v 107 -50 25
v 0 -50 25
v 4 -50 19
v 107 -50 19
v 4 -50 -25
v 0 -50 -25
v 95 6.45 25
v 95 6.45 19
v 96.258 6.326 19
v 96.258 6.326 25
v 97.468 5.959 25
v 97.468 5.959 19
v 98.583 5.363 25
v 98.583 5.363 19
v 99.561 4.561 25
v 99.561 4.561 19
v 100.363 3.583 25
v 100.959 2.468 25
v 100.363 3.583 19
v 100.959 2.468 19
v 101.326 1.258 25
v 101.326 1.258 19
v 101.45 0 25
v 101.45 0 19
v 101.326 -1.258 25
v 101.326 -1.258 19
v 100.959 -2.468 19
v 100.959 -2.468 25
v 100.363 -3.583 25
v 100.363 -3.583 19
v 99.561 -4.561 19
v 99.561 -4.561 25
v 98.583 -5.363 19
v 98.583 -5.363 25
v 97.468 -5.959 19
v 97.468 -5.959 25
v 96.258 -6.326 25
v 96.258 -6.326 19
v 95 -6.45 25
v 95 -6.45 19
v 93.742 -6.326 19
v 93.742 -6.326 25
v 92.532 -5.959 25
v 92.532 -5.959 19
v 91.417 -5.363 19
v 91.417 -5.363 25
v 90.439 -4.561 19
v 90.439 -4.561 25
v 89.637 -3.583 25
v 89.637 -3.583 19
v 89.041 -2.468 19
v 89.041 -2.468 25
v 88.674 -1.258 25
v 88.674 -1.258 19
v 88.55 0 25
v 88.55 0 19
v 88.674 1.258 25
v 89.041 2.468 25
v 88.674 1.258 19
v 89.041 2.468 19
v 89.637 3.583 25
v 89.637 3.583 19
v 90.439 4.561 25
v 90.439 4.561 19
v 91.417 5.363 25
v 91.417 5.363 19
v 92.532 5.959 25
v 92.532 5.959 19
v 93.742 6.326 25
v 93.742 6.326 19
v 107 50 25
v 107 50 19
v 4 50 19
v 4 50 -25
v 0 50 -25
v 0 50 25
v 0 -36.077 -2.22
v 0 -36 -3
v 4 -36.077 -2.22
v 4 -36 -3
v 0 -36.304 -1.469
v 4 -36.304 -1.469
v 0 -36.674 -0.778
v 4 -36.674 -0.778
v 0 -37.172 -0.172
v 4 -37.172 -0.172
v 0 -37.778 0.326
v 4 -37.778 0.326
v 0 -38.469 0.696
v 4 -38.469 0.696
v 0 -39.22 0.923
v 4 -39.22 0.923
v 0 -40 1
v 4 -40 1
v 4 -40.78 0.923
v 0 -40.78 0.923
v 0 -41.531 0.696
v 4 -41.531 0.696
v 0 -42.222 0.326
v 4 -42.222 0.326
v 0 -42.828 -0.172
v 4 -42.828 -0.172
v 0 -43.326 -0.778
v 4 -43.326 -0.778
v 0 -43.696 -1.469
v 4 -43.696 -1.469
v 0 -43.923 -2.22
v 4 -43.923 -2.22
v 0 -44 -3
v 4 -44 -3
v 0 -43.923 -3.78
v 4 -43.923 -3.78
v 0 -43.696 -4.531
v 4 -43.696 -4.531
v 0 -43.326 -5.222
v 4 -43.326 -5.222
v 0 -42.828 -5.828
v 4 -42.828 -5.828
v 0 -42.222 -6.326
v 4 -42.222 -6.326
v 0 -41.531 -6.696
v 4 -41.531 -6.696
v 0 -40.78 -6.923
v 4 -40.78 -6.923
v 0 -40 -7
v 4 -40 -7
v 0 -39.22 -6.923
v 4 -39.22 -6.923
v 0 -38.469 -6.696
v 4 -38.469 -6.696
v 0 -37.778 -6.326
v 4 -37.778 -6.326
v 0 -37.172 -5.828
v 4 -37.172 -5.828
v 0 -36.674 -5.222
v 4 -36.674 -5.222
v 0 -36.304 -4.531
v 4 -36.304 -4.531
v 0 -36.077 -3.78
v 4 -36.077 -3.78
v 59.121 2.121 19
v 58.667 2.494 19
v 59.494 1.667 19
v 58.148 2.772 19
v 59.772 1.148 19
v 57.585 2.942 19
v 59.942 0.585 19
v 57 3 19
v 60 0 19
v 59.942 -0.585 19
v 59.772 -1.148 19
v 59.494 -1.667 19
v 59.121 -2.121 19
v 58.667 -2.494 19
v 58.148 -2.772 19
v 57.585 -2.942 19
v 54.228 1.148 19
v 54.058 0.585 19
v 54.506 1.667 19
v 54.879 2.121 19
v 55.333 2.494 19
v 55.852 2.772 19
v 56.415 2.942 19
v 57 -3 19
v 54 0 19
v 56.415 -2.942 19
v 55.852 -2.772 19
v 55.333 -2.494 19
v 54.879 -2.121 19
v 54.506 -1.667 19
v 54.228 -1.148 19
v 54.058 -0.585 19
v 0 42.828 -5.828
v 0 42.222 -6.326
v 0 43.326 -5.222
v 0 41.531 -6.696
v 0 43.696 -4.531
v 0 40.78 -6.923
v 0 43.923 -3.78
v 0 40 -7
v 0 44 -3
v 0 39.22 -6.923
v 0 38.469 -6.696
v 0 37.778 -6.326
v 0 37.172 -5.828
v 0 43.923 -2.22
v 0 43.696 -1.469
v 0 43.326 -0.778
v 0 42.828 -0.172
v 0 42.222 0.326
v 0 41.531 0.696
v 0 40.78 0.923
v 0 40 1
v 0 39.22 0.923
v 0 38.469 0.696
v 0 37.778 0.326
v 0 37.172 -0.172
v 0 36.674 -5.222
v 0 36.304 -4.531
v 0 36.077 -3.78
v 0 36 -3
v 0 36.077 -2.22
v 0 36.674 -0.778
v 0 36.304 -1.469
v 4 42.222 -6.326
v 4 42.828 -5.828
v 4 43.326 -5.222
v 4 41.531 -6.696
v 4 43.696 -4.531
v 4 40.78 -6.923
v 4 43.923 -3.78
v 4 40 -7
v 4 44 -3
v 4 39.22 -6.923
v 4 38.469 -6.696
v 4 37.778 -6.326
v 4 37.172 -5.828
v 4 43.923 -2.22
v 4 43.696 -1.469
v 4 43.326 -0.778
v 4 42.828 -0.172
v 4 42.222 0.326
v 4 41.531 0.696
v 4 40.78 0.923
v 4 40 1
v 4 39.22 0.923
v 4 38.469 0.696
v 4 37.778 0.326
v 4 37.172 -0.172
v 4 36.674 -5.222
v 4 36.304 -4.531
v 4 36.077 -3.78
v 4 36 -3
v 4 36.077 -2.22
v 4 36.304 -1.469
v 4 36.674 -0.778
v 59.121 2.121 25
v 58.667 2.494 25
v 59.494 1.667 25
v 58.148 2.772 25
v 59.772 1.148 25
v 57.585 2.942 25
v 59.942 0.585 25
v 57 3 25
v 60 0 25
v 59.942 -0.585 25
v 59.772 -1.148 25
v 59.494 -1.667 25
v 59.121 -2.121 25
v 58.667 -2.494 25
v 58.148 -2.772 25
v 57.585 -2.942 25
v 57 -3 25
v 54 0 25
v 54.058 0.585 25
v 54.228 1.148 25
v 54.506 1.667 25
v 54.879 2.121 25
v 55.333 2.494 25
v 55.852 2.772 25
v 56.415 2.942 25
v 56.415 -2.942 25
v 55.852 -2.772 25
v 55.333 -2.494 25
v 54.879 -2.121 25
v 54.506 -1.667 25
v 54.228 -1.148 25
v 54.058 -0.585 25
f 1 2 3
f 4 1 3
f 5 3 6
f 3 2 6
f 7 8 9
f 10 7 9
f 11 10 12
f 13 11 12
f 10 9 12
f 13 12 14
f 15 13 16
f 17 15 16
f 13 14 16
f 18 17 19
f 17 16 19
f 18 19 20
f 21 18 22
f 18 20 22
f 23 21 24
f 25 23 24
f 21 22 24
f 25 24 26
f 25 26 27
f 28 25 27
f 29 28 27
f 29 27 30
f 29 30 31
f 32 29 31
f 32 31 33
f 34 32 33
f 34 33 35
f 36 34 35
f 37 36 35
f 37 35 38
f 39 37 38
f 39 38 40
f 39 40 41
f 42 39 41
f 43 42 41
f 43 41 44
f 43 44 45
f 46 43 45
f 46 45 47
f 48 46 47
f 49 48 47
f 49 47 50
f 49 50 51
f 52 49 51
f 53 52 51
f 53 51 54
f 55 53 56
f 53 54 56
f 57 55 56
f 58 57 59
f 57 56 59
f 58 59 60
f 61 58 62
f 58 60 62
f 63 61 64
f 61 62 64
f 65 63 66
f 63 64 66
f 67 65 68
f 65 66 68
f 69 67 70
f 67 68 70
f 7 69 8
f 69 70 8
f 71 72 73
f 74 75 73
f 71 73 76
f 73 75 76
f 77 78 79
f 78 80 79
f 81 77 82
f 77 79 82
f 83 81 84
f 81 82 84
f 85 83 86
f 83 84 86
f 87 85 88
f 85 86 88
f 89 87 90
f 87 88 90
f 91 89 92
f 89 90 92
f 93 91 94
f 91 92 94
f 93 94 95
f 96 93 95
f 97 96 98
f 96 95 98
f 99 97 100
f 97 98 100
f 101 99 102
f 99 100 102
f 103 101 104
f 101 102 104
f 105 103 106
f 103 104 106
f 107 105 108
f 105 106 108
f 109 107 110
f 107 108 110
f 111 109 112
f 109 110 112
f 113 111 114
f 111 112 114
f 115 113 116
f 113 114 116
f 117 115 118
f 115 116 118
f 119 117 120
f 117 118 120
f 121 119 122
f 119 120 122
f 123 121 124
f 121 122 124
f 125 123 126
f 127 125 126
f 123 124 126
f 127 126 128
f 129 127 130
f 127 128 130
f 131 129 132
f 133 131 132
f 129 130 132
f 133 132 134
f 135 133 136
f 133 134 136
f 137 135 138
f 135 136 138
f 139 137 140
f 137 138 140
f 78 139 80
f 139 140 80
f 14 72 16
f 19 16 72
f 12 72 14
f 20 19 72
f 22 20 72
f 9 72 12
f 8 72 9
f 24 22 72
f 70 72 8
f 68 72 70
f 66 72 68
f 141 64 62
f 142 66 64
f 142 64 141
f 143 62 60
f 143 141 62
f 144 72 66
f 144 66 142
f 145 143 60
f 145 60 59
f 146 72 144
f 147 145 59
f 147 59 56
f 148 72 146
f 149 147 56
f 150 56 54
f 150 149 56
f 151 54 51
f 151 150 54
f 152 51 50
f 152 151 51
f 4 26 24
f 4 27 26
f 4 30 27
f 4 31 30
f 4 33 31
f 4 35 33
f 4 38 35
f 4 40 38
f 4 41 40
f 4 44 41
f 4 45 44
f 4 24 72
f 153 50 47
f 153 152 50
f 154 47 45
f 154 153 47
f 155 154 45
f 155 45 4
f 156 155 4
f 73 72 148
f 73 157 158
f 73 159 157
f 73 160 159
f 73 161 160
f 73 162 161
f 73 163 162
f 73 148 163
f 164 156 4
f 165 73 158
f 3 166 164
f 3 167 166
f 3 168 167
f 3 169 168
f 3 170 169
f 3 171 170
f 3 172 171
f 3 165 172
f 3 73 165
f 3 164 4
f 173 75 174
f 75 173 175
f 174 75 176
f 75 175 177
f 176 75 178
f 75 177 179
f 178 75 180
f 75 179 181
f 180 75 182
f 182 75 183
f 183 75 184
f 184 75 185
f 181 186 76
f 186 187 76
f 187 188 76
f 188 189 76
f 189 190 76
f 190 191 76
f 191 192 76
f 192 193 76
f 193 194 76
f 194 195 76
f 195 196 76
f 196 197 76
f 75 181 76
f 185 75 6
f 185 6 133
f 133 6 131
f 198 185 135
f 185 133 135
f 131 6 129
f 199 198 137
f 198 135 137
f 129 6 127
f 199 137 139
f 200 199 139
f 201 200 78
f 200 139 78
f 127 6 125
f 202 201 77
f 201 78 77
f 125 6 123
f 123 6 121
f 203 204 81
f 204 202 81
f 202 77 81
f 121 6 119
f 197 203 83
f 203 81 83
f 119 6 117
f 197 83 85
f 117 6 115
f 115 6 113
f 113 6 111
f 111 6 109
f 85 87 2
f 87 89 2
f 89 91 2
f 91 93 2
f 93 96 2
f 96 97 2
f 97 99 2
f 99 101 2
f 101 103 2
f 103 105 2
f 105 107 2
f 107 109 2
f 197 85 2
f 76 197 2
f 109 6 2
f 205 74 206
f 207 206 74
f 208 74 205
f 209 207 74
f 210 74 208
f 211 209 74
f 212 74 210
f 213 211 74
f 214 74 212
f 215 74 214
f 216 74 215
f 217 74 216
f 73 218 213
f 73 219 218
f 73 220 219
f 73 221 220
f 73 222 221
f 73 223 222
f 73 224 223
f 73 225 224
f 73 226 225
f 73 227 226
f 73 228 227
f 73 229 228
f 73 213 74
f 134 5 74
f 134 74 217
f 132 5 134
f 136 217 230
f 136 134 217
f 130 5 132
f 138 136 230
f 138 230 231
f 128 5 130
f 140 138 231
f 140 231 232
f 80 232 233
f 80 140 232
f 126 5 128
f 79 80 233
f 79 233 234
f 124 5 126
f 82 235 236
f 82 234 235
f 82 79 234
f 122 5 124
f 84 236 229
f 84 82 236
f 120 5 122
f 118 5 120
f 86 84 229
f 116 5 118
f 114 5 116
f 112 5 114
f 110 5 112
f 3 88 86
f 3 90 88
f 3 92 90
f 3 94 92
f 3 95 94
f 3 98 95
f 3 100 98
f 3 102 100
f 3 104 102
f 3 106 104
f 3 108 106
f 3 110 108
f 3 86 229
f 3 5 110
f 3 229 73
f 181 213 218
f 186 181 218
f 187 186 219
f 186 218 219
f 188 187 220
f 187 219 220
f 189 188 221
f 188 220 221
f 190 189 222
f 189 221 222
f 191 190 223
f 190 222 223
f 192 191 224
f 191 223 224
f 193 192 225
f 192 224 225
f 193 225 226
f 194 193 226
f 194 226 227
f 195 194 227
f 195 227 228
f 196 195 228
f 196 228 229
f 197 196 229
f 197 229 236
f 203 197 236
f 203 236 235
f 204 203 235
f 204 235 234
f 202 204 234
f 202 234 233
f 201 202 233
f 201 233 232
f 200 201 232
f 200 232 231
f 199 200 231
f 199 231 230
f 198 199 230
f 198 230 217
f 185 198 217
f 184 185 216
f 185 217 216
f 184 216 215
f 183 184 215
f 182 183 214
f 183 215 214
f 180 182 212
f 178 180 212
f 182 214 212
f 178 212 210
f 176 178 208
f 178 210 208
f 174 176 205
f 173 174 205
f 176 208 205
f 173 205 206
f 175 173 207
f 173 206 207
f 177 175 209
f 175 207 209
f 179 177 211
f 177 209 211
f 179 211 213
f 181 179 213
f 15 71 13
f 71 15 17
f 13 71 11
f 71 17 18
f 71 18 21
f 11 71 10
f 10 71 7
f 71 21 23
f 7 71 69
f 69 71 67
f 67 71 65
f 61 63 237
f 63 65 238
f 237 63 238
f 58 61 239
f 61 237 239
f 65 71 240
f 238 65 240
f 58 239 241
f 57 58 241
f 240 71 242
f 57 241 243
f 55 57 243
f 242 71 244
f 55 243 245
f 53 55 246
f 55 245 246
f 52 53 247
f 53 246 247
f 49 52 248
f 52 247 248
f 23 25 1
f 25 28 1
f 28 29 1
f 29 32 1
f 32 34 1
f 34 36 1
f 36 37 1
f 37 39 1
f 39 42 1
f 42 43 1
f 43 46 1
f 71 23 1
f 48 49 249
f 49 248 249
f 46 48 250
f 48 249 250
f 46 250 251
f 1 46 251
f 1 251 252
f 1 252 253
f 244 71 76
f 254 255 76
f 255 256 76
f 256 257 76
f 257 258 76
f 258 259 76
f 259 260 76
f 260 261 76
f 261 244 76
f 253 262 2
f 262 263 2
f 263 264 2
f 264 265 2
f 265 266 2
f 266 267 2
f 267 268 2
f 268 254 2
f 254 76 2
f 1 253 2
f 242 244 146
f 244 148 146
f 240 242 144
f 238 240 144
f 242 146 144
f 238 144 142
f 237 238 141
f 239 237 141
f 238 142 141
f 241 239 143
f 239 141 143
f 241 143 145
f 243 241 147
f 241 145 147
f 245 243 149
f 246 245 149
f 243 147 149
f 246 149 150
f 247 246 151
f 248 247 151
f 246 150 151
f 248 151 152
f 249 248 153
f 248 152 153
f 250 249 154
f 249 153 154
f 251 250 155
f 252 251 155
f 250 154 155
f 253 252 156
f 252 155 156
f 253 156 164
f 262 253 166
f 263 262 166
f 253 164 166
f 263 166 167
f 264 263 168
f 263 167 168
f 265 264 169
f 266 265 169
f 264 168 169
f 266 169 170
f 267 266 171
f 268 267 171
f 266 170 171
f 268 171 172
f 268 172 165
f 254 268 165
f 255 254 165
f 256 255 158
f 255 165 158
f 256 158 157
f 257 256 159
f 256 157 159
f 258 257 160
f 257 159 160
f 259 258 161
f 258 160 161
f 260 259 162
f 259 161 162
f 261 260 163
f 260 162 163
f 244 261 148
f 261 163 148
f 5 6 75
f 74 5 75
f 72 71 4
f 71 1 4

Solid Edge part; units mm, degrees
sketch "Sketch1" plane through (0, 0, 0) normal (1, 0, 0) x (0, 1, 0)
  line L0 (-50, 25) -> (-50, -25)
  line L1 (-50, -25) -> (50, -25)
  line L2 (50, -25) -> (50, 25)
  line L3 (50, 25) -> (-50, 25)
extrude "Protrusion1" add sketch "Sketch1" along normal blind 4
sketch "Sketch2" plane through (4, 0, 0) normal (1, 0, 0) x (0, 1, 0)
  line L0 (50, 19) -> (-50, 19)
  line L1 (-50, 19) -> (-50, 25)
  line L2 (-50, 25) -> (50, 25)
  line L3 (50, 25) -> (50, 19)
extrude "ExtrudedProtrusion_2" add sketch "Sketch2" along normal blind 103
sketch "Sketch3" plane through (55.5, 0, 19) normal (0, 0, -1) x (0, 1, 0)
  circle A0 centre (0, 39.5) radius 6.45
  circle A1 centre (0, 1.5) radius 3
  dimension "D1" = 12
  dimension "D2" = 6
  dimension "D3" = 50
extrude "ExtrudedCutout_1" cut sketch "Sketch3" against normal blind 28.1055
sketch "Sketch4" plane through (4, 0, 0) normal (1, 0, 0) x (0, 1, 0)
  circle A0 centre (-40, -3) radius 4
  circle A1 centre (40, -3) radius 4
  dimension "D1" = 10
  dimension "D2" = 10
extrude "Cutout1" cut sketch "Sketch4" against normal up to next
properties material "Stainless steel"
